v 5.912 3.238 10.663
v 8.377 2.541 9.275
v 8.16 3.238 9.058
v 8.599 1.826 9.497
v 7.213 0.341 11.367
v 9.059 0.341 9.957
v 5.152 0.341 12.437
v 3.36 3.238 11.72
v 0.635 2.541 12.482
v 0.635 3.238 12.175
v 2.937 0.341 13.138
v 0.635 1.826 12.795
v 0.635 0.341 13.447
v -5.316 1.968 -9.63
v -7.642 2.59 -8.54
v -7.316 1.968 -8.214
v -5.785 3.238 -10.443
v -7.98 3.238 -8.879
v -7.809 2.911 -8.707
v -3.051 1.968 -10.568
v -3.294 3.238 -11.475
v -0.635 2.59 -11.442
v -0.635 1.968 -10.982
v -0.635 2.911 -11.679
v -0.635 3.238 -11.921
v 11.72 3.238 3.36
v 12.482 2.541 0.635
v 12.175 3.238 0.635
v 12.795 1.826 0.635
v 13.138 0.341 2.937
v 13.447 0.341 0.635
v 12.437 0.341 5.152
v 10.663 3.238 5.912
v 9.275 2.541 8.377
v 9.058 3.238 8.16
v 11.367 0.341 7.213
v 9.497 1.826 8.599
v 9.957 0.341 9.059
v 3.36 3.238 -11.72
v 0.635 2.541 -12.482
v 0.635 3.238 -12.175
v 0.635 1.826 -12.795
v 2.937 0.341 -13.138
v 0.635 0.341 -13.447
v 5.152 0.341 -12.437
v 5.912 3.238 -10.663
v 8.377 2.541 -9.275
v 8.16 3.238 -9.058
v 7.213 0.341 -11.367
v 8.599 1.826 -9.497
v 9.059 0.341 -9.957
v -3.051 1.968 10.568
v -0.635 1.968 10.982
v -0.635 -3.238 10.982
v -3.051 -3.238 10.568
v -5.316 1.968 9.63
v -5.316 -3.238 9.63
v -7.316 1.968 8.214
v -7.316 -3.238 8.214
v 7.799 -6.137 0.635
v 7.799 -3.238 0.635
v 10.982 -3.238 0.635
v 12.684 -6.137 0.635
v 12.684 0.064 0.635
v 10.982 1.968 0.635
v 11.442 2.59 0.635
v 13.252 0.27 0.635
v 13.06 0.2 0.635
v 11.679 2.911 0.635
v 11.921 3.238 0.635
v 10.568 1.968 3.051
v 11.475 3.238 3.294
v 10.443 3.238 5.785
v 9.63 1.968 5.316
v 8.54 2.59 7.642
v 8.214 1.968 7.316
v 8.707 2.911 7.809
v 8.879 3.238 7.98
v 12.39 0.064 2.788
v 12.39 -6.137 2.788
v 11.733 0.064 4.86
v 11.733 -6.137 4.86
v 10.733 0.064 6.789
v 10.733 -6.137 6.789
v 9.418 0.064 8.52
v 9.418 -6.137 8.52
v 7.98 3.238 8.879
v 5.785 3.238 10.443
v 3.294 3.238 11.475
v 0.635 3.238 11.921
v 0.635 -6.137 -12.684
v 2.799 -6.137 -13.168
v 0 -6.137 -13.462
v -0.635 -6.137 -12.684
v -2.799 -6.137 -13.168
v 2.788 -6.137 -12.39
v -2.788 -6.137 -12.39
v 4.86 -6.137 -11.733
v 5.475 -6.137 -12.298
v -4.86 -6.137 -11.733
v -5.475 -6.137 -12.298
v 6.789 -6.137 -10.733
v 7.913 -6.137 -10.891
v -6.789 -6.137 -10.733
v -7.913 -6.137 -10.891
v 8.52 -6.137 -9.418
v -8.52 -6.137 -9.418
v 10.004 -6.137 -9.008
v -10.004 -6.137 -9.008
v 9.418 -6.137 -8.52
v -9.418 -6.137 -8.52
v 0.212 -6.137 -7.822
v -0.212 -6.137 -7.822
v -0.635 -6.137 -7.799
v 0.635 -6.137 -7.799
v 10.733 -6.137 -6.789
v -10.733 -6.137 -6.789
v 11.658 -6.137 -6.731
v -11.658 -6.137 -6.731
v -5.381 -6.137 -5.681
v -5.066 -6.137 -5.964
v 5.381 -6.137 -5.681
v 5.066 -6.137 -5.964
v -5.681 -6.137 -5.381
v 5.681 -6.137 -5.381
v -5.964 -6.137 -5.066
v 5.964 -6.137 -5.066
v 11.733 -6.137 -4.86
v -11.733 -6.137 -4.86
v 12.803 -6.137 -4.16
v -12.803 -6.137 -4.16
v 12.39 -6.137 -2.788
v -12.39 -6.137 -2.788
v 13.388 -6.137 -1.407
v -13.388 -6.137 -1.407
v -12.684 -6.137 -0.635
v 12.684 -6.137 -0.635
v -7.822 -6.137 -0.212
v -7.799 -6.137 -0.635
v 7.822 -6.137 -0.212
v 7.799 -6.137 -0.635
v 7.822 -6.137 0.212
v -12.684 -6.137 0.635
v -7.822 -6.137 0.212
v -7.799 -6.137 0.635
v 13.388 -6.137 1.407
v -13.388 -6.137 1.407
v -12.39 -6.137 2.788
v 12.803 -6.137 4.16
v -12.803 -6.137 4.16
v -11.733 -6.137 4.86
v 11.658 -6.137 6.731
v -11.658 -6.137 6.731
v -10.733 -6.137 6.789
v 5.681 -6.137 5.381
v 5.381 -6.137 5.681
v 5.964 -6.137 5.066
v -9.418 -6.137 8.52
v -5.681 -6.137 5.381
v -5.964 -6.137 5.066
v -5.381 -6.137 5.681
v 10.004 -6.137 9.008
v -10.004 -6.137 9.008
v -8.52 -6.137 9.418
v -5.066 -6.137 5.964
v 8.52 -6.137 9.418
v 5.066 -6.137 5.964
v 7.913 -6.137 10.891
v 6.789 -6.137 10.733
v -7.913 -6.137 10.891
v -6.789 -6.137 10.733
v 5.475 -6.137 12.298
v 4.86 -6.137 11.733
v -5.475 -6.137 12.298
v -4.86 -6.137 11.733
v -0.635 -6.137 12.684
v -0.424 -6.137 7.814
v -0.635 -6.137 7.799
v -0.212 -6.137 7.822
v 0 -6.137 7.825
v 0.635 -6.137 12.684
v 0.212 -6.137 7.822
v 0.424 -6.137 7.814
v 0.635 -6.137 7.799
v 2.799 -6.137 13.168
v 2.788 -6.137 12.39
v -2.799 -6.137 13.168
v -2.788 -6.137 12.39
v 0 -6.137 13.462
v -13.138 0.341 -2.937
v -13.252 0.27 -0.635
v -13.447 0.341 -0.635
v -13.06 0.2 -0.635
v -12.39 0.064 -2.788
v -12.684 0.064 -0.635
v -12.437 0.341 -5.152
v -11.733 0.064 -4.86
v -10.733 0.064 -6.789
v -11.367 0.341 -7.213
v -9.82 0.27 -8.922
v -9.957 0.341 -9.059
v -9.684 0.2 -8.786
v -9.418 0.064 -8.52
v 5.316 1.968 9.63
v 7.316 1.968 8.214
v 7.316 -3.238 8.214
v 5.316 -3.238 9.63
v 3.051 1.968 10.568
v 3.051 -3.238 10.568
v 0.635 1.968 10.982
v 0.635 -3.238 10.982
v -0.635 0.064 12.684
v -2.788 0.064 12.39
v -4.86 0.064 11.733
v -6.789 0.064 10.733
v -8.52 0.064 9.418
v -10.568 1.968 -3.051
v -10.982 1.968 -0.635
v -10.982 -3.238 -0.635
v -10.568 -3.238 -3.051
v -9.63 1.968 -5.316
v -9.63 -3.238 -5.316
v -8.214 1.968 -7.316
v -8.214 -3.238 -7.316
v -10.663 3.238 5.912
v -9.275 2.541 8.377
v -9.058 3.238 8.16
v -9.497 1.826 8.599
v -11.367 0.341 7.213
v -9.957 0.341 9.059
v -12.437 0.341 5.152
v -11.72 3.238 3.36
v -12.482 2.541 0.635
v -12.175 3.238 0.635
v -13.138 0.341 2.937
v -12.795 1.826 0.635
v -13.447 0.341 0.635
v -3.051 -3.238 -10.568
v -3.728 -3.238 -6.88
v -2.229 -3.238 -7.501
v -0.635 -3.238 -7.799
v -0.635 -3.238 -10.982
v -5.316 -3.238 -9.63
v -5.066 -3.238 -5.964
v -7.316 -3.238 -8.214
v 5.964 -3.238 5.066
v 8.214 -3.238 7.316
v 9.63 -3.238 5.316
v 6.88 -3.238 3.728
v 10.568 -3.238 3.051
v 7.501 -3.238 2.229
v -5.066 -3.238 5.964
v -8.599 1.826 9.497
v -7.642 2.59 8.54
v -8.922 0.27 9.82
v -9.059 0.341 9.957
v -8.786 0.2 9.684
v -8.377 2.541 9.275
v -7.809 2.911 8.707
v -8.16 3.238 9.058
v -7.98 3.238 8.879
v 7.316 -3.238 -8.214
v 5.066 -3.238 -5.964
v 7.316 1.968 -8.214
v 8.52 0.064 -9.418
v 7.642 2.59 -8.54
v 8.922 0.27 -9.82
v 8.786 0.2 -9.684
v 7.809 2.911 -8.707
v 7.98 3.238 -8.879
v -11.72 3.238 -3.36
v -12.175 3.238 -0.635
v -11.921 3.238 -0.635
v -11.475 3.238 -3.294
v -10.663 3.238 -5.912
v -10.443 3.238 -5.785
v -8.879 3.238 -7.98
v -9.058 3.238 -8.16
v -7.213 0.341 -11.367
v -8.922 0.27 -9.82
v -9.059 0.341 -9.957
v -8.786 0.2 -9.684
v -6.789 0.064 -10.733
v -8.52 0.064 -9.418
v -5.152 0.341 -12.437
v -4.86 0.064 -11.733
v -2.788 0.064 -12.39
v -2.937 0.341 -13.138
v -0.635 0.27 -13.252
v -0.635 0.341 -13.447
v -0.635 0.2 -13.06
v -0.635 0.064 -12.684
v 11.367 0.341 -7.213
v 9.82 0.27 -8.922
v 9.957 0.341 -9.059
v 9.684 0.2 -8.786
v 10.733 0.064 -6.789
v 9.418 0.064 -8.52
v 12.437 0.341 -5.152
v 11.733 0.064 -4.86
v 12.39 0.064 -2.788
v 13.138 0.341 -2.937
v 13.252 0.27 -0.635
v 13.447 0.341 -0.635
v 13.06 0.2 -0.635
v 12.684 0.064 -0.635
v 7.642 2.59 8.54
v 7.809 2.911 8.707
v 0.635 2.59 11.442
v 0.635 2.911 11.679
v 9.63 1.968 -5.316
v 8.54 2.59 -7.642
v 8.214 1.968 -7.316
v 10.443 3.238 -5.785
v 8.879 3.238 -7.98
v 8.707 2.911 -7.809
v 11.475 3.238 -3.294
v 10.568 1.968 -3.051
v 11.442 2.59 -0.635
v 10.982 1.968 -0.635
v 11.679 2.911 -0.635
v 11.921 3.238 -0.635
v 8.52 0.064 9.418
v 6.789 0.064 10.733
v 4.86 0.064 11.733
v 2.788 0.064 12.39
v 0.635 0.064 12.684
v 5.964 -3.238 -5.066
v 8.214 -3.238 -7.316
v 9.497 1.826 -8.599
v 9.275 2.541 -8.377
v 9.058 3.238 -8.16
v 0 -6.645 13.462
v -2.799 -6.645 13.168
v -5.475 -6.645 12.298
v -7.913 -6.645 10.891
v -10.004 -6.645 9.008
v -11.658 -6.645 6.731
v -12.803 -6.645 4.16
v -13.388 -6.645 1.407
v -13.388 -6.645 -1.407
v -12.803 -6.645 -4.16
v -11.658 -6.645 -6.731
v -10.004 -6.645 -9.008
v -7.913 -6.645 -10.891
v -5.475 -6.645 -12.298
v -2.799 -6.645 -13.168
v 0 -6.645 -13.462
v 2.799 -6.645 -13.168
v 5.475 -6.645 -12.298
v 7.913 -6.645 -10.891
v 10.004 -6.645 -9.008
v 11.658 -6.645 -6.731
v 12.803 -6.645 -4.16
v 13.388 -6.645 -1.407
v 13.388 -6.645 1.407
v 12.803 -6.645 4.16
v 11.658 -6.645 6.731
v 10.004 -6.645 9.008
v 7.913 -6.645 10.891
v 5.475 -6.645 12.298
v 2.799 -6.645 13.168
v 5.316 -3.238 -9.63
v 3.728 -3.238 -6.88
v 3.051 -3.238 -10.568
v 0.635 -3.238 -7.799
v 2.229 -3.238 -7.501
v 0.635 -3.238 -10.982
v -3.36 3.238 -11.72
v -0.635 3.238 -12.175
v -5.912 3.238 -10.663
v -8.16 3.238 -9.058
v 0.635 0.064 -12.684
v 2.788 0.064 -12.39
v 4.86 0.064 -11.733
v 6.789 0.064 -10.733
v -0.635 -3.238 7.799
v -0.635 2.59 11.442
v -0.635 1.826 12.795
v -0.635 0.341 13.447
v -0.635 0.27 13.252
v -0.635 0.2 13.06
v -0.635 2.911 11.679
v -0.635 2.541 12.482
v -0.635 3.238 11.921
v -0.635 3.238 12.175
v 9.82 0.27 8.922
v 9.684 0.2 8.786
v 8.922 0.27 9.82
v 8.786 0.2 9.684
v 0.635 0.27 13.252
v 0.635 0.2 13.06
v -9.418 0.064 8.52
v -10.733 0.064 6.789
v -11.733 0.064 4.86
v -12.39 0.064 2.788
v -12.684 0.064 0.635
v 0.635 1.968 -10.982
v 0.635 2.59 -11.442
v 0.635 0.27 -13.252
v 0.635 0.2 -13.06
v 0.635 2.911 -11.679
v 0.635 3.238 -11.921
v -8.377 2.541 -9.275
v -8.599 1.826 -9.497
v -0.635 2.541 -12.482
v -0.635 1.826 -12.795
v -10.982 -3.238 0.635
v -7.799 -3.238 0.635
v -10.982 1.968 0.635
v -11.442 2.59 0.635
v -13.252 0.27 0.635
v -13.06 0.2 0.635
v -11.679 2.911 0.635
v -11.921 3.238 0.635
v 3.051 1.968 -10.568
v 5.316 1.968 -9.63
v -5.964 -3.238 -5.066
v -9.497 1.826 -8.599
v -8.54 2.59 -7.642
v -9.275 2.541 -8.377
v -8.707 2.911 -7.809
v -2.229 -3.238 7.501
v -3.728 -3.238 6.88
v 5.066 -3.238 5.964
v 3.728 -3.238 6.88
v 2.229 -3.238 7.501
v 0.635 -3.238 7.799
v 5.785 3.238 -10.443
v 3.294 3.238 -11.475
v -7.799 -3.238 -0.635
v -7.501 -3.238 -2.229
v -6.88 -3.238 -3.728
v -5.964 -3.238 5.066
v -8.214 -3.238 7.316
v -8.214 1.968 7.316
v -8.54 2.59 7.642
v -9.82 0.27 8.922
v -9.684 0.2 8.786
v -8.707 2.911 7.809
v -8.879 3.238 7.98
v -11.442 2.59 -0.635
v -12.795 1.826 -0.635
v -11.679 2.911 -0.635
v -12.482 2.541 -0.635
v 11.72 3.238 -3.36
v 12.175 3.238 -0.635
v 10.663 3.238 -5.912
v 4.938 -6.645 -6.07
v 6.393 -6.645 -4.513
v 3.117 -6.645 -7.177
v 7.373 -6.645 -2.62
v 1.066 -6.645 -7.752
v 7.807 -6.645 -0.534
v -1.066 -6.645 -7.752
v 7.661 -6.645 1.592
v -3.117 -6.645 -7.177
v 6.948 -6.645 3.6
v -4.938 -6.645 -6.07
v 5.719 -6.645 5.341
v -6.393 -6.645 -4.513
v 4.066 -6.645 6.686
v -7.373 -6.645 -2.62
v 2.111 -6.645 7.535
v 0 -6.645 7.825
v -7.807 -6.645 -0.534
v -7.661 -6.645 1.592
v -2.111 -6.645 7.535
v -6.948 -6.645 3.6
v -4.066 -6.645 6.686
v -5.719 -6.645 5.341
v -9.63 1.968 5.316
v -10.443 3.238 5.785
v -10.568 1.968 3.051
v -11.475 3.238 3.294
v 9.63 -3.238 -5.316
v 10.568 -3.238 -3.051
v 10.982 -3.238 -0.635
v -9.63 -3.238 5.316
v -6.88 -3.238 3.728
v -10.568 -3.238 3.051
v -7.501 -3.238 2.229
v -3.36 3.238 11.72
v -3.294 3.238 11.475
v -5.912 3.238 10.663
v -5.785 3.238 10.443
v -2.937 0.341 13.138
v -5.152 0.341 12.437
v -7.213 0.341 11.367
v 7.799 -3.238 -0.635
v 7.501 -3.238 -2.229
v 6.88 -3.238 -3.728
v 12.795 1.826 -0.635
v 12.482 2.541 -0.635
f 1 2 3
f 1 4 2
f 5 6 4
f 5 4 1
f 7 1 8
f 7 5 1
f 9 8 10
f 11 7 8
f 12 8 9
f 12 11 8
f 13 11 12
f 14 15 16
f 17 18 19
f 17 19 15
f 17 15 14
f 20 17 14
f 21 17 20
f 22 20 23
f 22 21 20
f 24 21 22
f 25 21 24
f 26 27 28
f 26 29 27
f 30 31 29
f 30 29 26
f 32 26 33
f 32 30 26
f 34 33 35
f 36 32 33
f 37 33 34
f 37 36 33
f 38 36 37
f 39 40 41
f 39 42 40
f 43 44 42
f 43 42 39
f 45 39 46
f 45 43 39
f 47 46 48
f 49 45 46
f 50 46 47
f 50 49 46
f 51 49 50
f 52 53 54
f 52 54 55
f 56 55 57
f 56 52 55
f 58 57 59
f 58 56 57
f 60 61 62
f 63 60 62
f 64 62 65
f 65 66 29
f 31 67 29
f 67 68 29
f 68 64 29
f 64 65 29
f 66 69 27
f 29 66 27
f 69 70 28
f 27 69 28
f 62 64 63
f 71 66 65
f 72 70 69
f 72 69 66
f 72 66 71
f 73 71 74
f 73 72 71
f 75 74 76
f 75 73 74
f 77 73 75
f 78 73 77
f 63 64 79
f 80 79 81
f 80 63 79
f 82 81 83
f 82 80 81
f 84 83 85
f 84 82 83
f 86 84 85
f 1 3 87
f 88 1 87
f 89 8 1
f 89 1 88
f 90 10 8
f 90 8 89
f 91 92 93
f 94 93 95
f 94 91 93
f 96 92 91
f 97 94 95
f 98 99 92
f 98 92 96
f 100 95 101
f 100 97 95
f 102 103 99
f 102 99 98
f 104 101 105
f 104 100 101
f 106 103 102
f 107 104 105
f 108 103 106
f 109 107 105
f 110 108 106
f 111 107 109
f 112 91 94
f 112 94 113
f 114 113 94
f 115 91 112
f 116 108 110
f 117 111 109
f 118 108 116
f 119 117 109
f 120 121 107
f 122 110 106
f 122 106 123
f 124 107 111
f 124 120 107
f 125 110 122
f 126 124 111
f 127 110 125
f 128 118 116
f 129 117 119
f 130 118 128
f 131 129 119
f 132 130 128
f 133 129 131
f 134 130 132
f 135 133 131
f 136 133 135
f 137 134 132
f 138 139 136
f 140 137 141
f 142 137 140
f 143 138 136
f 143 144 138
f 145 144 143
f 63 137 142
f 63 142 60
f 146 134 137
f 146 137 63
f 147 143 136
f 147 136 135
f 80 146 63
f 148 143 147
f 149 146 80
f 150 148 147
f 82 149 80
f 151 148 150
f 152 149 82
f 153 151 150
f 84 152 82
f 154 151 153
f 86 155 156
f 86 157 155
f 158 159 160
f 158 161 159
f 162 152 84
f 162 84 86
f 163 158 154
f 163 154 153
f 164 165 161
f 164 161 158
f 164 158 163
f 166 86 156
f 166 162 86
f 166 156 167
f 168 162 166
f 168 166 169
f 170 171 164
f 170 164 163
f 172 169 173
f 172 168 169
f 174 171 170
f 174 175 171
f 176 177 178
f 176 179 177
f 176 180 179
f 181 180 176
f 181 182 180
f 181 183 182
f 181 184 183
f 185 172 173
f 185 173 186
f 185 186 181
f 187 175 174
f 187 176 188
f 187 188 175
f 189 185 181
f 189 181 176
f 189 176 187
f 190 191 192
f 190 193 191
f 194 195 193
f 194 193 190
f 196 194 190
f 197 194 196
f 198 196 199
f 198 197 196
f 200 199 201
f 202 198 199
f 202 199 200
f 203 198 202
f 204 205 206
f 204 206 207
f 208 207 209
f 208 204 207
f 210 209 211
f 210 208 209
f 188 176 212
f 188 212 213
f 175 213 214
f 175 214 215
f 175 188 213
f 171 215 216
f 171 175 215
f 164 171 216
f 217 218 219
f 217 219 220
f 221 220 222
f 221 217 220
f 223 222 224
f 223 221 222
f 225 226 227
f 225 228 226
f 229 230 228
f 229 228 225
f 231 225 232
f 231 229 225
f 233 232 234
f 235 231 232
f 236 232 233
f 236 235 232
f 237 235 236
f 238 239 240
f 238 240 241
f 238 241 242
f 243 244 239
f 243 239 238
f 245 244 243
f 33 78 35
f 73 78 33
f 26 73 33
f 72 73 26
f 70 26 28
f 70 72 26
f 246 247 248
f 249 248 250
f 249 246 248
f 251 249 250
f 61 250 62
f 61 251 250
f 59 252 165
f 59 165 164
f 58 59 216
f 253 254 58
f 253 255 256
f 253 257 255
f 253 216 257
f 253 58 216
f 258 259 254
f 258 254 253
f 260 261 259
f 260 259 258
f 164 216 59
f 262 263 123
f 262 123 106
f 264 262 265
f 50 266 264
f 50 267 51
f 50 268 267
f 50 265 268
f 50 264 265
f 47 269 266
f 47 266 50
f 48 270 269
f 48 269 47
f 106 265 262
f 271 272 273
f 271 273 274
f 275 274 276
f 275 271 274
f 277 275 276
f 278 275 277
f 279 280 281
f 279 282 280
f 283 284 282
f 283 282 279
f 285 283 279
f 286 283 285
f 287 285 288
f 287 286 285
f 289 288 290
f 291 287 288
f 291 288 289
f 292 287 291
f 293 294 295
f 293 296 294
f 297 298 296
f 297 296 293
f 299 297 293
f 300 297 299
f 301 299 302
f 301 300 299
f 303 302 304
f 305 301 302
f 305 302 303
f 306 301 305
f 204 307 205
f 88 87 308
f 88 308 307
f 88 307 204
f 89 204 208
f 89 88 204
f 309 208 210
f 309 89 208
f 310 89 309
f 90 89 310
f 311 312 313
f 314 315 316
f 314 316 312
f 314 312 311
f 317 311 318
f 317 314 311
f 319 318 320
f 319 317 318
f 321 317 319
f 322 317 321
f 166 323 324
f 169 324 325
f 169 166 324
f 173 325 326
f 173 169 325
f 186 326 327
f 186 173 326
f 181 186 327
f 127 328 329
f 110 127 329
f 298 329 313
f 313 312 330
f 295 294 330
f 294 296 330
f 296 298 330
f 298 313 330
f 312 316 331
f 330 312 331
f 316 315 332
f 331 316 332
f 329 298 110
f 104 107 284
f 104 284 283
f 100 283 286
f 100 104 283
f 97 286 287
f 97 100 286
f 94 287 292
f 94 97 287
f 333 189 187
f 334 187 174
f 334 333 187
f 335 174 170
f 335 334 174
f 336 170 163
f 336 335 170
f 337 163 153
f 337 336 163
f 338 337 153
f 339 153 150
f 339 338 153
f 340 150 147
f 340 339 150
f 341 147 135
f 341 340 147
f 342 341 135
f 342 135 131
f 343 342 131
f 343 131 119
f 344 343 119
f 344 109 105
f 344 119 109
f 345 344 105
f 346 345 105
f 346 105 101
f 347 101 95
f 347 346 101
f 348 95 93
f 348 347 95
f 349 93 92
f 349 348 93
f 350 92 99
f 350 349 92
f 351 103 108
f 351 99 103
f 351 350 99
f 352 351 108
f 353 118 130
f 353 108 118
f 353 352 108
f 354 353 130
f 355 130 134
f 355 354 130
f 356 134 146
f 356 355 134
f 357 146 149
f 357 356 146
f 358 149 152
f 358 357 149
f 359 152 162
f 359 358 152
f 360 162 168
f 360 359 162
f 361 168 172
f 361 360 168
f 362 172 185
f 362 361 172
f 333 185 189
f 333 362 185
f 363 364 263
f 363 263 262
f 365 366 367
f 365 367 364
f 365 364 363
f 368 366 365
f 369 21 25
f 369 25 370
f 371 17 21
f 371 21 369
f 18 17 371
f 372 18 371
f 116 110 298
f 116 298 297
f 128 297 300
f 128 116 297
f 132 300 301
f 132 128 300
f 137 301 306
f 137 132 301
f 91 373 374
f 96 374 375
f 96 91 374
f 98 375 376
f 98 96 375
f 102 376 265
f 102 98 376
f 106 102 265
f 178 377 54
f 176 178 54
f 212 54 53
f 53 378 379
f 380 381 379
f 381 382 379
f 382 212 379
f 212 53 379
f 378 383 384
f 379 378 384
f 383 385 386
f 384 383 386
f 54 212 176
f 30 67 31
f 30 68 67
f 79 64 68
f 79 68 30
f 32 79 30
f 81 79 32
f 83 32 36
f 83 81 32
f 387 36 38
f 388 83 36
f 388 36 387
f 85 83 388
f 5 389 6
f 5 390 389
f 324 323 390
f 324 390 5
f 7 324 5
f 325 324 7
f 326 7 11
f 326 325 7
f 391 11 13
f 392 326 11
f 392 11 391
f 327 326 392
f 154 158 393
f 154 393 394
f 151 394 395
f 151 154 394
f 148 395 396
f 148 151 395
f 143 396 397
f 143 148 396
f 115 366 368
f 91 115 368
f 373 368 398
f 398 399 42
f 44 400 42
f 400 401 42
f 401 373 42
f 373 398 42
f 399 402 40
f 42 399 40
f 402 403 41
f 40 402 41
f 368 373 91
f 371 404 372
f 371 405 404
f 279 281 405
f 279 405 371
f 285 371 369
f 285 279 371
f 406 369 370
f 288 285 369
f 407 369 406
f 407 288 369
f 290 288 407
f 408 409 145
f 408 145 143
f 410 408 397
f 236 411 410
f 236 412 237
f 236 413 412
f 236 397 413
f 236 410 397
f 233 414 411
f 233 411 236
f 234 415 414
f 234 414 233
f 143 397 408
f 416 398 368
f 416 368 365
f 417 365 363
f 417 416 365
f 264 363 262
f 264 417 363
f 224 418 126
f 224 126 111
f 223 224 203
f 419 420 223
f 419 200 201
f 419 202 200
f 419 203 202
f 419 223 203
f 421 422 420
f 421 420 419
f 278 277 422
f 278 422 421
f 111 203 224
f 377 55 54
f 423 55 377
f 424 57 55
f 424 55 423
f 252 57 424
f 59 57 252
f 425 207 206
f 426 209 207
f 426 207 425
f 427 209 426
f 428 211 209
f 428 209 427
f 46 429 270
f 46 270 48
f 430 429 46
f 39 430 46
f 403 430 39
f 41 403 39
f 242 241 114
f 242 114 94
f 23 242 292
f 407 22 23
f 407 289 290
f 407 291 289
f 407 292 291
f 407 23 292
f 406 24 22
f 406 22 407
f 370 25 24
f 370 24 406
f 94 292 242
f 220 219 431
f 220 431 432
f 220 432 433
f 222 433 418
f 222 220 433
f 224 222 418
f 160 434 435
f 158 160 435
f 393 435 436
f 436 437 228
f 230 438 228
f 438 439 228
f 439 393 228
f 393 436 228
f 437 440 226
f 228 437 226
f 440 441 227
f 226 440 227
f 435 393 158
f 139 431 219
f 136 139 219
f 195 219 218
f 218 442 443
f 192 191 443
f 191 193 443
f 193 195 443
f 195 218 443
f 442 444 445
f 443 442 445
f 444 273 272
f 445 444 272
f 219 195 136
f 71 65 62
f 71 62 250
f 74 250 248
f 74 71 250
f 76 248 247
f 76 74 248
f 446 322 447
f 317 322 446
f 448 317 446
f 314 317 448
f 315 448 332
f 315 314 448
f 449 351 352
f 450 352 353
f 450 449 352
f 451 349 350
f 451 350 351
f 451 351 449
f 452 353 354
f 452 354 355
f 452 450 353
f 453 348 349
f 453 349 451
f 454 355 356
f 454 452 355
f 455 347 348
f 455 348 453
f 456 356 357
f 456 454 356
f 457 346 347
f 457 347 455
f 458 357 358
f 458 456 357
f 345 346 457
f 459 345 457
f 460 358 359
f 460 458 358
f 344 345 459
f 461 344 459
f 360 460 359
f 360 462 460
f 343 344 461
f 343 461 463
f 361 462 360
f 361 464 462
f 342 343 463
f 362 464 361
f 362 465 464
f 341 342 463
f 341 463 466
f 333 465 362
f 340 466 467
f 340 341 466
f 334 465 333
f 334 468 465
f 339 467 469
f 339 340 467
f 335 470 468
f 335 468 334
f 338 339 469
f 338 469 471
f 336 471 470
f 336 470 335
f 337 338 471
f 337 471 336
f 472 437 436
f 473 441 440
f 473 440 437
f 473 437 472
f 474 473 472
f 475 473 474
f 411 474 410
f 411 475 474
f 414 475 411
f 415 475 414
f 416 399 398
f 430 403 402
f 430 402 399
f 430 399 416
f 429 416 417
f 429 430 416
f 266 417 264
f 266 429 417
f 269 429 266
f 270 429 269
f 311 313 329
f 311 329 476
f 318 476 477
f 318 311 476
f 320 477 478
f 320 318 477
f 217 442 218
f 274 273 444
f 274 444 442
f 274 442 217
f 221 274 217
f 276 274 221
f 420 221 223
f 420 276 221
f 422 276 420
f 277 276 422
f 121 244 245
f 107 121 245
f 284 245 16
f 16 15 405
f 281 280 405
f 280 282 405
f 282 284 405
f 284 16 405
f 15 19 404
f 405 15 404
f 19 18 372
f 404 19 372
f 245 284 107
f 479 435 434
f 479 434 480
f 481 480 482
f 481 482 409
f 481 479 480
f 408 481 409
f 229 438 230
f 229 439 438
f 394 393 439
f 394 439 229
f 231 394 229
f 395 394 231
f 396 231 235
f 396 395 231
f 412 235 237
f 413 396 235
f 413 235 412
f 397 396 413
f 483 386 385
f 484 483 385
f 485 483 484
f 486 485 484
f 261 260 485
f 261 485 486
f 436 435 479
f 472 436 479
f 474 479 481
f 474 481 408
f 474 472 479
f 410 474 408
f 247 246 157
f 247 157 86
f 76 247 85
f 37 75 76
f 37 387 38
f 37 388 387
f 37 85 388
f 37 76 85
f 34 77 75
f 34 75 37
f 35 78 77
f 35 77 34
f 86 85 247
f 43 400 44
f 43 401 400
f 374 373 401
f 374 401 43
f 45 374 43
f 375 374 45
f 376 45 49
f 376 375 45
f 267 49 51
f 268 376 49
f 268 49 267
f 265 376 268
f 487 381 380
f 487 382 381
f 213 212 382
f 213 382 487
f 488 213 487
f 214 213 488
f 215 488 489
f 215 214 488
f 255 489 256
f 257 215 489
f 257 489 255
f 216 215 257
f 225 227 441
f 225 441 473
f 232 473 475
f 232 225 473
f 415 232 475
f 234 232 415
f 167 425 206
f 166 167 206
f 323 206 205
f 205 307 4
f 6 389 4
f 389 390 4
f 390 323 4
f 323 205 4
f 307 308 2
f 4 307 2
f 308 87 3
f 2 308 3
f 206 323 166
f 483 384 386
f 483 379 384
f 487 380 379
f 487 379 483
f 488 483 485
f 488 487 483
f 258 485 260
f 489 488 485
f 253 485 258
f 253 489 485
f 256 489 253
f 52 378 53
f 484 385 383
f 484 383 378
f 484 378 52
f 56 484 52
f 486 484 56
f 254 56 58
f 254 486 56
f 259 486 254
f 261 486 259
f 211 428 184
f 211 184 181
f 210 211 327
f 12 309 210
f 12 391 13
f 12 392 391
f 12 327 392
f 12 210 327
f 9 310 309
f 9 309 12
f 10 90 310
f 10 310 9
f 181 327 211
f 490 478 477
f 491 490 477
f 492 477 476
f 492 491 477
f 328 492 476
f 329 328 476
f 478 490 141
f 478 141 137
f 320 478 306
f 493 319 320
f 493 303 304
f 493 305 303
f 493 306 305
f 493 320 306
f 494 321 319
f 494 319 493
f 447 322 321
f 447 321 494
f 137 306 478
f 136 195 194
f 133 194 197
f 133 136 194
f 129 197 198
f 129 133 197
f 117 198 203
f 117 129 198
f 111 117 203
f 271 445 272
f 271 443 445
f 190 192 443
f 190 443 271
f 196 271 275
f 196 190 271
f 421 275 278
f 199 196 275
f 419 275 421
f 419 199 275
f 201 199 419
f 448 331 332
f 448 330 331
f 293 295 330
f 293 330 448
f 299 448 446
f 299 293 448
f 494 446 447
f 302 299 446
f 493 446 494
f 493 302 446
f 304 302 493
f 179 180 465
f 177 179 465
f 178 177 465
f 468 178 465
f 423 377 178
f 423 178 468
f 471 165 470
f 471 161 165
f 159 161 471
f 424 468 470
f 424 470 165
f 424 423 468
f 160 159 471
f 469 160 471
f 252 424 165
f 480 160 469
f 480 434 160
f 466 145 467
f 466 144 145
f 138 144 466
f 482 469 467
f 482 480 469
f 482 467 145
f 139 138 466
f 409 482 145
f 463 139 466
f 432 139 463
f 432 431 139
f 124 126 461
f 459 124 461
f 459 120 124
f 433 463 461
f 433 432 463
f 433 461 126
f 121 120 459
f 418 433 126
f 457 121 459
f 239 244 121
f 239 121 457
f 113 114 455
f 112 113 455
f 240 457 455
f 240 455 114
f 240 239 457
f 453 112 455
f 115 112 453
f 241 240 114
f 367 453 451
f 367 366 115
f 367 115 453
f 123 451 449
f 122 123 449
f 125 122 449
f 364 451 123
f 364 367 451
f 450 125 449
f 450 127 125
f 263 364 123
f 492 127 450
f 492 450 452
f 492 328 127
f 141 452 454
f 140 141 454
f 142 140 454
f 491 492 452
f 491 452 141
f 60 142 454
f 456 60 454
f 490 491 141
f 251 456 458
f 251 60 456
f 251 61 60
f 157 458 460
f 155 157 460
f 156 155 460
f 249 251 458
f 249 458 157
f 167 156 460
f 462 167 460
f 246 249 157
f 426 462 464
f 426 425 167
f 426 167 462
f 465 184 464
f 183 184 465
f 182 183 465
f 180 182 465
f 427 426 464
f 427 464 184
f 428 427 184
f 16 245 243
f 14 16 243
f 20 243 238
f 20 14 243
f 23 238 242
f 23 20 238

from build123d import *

# Parameters (mm, degrees)
CUT_EXTRUDE3_REACH             = 23.451
SKETCH6_W                      = 1.27
SKETCH6_H                      = 13.462
CUT_EXTRUDE3_DIRECTION_2_DEPTH = 22.45051463
CIRPATTERN1_COUNT              = 8


with BuildPart() as part:
    # Sketch5 → Revolve1 (revolve)
    with BuildSketch(Plane.XY, mode=Mode.PRIVATE) as revolve1_sk:
        Polygon((-11, -3.2385), (-11, 1.9685), (-11.938, 3.2385), (-12.192, 3.2385), (-13.462, 0.340845319), (-12.7, 0.0635), (-12.7, -6.136500046), (-13.462, -6.136500046), (-13.462, -6.644500046), (-7.825, -6.644500046), (-7.825, -3.2385), align=None)
    revolve(revolve1_sk.sketch.rotate(Axis((0, 0.0635, 0), (0, -1, 0)), 270), axis=Axis((0, 0.0635, 0), (0, -1, 0)))

    # Cut-Extrude3: up to this face of the body (flat: up to its plane)
    cut_extrude3_end = Plane(part.part.faces().sort_by_distance((0, -6.136500046, -13.08076286))[0])
    # Sketch6 → Cut-Extrude3 (cut, up to the picked face)
    with BuildSketch(Plane(origin=(0, 3.2385, 0), x_dir=(1, 0, 0), z_dir=(0, 1, 0)), mode=Mode.PRIVATE) as cut_extrude3_sk1:
        with Locations((0, 6.731)):
            Rectangle(SKETCH6_W, SKETCH6_H)
    cut_extrude3_tool1 = split(extrude(cut_extrude3_sk1.sketch, amount=-CUT_EXTRUDE3_REACH, mode=Mode.PRIVATE), bisect_by=cut_extrude3_end, keep=Keep.BOTH, mode=Mode.PRIVATE)
    cut_extrude3 = cut_extrude3_tool1.solids().sort_by(Axis((0, 3.2385, -6.731), (0, -1, 0)))[0]
    add(cut_extrude3, mode=Mode.SUBTRACT)

    # Sketch6 → Cut-Extrude3 direction 2 (cut)
    with BuildSketch(Plane(origin=(0, 3.2385, 0), x_dir=(1, 0, 0), z_dir=(0, 1, 0))):
        with Locations((0, 6.731)):
            Rectangle(SKETCH6_W, SKETCH6_H)
    cut_extrude3_direction_2 = extrude(amount=CUT_EXTRUDE3_DIRECTION_2_DEPTH, mode=Mode.SUBTRACT)

    # CirPattern1: Cut-Extrude3, Cut-Extrude3 direction 2 ×8 about axis
    cirpattern1_axis = Axis((0, 0, 0), (0, 1, 0))
    add([cut_extrude3.rotate(cirpattern1_axis, i * 360 / CIRPATTERN1_COUNT) for i in range(1, CIRPATTERN1_COUNT)], mode=Mode.SUBTRACT)
    add([cut_extrude3_direction_2.rotate(cirpattern1_axis, i * 360 / CIRPATTERN1_COUNT) for i in range(1, CIRPATTERN1_COUNT)], mode=Mode.SUBTRACT)


solid = part.part
